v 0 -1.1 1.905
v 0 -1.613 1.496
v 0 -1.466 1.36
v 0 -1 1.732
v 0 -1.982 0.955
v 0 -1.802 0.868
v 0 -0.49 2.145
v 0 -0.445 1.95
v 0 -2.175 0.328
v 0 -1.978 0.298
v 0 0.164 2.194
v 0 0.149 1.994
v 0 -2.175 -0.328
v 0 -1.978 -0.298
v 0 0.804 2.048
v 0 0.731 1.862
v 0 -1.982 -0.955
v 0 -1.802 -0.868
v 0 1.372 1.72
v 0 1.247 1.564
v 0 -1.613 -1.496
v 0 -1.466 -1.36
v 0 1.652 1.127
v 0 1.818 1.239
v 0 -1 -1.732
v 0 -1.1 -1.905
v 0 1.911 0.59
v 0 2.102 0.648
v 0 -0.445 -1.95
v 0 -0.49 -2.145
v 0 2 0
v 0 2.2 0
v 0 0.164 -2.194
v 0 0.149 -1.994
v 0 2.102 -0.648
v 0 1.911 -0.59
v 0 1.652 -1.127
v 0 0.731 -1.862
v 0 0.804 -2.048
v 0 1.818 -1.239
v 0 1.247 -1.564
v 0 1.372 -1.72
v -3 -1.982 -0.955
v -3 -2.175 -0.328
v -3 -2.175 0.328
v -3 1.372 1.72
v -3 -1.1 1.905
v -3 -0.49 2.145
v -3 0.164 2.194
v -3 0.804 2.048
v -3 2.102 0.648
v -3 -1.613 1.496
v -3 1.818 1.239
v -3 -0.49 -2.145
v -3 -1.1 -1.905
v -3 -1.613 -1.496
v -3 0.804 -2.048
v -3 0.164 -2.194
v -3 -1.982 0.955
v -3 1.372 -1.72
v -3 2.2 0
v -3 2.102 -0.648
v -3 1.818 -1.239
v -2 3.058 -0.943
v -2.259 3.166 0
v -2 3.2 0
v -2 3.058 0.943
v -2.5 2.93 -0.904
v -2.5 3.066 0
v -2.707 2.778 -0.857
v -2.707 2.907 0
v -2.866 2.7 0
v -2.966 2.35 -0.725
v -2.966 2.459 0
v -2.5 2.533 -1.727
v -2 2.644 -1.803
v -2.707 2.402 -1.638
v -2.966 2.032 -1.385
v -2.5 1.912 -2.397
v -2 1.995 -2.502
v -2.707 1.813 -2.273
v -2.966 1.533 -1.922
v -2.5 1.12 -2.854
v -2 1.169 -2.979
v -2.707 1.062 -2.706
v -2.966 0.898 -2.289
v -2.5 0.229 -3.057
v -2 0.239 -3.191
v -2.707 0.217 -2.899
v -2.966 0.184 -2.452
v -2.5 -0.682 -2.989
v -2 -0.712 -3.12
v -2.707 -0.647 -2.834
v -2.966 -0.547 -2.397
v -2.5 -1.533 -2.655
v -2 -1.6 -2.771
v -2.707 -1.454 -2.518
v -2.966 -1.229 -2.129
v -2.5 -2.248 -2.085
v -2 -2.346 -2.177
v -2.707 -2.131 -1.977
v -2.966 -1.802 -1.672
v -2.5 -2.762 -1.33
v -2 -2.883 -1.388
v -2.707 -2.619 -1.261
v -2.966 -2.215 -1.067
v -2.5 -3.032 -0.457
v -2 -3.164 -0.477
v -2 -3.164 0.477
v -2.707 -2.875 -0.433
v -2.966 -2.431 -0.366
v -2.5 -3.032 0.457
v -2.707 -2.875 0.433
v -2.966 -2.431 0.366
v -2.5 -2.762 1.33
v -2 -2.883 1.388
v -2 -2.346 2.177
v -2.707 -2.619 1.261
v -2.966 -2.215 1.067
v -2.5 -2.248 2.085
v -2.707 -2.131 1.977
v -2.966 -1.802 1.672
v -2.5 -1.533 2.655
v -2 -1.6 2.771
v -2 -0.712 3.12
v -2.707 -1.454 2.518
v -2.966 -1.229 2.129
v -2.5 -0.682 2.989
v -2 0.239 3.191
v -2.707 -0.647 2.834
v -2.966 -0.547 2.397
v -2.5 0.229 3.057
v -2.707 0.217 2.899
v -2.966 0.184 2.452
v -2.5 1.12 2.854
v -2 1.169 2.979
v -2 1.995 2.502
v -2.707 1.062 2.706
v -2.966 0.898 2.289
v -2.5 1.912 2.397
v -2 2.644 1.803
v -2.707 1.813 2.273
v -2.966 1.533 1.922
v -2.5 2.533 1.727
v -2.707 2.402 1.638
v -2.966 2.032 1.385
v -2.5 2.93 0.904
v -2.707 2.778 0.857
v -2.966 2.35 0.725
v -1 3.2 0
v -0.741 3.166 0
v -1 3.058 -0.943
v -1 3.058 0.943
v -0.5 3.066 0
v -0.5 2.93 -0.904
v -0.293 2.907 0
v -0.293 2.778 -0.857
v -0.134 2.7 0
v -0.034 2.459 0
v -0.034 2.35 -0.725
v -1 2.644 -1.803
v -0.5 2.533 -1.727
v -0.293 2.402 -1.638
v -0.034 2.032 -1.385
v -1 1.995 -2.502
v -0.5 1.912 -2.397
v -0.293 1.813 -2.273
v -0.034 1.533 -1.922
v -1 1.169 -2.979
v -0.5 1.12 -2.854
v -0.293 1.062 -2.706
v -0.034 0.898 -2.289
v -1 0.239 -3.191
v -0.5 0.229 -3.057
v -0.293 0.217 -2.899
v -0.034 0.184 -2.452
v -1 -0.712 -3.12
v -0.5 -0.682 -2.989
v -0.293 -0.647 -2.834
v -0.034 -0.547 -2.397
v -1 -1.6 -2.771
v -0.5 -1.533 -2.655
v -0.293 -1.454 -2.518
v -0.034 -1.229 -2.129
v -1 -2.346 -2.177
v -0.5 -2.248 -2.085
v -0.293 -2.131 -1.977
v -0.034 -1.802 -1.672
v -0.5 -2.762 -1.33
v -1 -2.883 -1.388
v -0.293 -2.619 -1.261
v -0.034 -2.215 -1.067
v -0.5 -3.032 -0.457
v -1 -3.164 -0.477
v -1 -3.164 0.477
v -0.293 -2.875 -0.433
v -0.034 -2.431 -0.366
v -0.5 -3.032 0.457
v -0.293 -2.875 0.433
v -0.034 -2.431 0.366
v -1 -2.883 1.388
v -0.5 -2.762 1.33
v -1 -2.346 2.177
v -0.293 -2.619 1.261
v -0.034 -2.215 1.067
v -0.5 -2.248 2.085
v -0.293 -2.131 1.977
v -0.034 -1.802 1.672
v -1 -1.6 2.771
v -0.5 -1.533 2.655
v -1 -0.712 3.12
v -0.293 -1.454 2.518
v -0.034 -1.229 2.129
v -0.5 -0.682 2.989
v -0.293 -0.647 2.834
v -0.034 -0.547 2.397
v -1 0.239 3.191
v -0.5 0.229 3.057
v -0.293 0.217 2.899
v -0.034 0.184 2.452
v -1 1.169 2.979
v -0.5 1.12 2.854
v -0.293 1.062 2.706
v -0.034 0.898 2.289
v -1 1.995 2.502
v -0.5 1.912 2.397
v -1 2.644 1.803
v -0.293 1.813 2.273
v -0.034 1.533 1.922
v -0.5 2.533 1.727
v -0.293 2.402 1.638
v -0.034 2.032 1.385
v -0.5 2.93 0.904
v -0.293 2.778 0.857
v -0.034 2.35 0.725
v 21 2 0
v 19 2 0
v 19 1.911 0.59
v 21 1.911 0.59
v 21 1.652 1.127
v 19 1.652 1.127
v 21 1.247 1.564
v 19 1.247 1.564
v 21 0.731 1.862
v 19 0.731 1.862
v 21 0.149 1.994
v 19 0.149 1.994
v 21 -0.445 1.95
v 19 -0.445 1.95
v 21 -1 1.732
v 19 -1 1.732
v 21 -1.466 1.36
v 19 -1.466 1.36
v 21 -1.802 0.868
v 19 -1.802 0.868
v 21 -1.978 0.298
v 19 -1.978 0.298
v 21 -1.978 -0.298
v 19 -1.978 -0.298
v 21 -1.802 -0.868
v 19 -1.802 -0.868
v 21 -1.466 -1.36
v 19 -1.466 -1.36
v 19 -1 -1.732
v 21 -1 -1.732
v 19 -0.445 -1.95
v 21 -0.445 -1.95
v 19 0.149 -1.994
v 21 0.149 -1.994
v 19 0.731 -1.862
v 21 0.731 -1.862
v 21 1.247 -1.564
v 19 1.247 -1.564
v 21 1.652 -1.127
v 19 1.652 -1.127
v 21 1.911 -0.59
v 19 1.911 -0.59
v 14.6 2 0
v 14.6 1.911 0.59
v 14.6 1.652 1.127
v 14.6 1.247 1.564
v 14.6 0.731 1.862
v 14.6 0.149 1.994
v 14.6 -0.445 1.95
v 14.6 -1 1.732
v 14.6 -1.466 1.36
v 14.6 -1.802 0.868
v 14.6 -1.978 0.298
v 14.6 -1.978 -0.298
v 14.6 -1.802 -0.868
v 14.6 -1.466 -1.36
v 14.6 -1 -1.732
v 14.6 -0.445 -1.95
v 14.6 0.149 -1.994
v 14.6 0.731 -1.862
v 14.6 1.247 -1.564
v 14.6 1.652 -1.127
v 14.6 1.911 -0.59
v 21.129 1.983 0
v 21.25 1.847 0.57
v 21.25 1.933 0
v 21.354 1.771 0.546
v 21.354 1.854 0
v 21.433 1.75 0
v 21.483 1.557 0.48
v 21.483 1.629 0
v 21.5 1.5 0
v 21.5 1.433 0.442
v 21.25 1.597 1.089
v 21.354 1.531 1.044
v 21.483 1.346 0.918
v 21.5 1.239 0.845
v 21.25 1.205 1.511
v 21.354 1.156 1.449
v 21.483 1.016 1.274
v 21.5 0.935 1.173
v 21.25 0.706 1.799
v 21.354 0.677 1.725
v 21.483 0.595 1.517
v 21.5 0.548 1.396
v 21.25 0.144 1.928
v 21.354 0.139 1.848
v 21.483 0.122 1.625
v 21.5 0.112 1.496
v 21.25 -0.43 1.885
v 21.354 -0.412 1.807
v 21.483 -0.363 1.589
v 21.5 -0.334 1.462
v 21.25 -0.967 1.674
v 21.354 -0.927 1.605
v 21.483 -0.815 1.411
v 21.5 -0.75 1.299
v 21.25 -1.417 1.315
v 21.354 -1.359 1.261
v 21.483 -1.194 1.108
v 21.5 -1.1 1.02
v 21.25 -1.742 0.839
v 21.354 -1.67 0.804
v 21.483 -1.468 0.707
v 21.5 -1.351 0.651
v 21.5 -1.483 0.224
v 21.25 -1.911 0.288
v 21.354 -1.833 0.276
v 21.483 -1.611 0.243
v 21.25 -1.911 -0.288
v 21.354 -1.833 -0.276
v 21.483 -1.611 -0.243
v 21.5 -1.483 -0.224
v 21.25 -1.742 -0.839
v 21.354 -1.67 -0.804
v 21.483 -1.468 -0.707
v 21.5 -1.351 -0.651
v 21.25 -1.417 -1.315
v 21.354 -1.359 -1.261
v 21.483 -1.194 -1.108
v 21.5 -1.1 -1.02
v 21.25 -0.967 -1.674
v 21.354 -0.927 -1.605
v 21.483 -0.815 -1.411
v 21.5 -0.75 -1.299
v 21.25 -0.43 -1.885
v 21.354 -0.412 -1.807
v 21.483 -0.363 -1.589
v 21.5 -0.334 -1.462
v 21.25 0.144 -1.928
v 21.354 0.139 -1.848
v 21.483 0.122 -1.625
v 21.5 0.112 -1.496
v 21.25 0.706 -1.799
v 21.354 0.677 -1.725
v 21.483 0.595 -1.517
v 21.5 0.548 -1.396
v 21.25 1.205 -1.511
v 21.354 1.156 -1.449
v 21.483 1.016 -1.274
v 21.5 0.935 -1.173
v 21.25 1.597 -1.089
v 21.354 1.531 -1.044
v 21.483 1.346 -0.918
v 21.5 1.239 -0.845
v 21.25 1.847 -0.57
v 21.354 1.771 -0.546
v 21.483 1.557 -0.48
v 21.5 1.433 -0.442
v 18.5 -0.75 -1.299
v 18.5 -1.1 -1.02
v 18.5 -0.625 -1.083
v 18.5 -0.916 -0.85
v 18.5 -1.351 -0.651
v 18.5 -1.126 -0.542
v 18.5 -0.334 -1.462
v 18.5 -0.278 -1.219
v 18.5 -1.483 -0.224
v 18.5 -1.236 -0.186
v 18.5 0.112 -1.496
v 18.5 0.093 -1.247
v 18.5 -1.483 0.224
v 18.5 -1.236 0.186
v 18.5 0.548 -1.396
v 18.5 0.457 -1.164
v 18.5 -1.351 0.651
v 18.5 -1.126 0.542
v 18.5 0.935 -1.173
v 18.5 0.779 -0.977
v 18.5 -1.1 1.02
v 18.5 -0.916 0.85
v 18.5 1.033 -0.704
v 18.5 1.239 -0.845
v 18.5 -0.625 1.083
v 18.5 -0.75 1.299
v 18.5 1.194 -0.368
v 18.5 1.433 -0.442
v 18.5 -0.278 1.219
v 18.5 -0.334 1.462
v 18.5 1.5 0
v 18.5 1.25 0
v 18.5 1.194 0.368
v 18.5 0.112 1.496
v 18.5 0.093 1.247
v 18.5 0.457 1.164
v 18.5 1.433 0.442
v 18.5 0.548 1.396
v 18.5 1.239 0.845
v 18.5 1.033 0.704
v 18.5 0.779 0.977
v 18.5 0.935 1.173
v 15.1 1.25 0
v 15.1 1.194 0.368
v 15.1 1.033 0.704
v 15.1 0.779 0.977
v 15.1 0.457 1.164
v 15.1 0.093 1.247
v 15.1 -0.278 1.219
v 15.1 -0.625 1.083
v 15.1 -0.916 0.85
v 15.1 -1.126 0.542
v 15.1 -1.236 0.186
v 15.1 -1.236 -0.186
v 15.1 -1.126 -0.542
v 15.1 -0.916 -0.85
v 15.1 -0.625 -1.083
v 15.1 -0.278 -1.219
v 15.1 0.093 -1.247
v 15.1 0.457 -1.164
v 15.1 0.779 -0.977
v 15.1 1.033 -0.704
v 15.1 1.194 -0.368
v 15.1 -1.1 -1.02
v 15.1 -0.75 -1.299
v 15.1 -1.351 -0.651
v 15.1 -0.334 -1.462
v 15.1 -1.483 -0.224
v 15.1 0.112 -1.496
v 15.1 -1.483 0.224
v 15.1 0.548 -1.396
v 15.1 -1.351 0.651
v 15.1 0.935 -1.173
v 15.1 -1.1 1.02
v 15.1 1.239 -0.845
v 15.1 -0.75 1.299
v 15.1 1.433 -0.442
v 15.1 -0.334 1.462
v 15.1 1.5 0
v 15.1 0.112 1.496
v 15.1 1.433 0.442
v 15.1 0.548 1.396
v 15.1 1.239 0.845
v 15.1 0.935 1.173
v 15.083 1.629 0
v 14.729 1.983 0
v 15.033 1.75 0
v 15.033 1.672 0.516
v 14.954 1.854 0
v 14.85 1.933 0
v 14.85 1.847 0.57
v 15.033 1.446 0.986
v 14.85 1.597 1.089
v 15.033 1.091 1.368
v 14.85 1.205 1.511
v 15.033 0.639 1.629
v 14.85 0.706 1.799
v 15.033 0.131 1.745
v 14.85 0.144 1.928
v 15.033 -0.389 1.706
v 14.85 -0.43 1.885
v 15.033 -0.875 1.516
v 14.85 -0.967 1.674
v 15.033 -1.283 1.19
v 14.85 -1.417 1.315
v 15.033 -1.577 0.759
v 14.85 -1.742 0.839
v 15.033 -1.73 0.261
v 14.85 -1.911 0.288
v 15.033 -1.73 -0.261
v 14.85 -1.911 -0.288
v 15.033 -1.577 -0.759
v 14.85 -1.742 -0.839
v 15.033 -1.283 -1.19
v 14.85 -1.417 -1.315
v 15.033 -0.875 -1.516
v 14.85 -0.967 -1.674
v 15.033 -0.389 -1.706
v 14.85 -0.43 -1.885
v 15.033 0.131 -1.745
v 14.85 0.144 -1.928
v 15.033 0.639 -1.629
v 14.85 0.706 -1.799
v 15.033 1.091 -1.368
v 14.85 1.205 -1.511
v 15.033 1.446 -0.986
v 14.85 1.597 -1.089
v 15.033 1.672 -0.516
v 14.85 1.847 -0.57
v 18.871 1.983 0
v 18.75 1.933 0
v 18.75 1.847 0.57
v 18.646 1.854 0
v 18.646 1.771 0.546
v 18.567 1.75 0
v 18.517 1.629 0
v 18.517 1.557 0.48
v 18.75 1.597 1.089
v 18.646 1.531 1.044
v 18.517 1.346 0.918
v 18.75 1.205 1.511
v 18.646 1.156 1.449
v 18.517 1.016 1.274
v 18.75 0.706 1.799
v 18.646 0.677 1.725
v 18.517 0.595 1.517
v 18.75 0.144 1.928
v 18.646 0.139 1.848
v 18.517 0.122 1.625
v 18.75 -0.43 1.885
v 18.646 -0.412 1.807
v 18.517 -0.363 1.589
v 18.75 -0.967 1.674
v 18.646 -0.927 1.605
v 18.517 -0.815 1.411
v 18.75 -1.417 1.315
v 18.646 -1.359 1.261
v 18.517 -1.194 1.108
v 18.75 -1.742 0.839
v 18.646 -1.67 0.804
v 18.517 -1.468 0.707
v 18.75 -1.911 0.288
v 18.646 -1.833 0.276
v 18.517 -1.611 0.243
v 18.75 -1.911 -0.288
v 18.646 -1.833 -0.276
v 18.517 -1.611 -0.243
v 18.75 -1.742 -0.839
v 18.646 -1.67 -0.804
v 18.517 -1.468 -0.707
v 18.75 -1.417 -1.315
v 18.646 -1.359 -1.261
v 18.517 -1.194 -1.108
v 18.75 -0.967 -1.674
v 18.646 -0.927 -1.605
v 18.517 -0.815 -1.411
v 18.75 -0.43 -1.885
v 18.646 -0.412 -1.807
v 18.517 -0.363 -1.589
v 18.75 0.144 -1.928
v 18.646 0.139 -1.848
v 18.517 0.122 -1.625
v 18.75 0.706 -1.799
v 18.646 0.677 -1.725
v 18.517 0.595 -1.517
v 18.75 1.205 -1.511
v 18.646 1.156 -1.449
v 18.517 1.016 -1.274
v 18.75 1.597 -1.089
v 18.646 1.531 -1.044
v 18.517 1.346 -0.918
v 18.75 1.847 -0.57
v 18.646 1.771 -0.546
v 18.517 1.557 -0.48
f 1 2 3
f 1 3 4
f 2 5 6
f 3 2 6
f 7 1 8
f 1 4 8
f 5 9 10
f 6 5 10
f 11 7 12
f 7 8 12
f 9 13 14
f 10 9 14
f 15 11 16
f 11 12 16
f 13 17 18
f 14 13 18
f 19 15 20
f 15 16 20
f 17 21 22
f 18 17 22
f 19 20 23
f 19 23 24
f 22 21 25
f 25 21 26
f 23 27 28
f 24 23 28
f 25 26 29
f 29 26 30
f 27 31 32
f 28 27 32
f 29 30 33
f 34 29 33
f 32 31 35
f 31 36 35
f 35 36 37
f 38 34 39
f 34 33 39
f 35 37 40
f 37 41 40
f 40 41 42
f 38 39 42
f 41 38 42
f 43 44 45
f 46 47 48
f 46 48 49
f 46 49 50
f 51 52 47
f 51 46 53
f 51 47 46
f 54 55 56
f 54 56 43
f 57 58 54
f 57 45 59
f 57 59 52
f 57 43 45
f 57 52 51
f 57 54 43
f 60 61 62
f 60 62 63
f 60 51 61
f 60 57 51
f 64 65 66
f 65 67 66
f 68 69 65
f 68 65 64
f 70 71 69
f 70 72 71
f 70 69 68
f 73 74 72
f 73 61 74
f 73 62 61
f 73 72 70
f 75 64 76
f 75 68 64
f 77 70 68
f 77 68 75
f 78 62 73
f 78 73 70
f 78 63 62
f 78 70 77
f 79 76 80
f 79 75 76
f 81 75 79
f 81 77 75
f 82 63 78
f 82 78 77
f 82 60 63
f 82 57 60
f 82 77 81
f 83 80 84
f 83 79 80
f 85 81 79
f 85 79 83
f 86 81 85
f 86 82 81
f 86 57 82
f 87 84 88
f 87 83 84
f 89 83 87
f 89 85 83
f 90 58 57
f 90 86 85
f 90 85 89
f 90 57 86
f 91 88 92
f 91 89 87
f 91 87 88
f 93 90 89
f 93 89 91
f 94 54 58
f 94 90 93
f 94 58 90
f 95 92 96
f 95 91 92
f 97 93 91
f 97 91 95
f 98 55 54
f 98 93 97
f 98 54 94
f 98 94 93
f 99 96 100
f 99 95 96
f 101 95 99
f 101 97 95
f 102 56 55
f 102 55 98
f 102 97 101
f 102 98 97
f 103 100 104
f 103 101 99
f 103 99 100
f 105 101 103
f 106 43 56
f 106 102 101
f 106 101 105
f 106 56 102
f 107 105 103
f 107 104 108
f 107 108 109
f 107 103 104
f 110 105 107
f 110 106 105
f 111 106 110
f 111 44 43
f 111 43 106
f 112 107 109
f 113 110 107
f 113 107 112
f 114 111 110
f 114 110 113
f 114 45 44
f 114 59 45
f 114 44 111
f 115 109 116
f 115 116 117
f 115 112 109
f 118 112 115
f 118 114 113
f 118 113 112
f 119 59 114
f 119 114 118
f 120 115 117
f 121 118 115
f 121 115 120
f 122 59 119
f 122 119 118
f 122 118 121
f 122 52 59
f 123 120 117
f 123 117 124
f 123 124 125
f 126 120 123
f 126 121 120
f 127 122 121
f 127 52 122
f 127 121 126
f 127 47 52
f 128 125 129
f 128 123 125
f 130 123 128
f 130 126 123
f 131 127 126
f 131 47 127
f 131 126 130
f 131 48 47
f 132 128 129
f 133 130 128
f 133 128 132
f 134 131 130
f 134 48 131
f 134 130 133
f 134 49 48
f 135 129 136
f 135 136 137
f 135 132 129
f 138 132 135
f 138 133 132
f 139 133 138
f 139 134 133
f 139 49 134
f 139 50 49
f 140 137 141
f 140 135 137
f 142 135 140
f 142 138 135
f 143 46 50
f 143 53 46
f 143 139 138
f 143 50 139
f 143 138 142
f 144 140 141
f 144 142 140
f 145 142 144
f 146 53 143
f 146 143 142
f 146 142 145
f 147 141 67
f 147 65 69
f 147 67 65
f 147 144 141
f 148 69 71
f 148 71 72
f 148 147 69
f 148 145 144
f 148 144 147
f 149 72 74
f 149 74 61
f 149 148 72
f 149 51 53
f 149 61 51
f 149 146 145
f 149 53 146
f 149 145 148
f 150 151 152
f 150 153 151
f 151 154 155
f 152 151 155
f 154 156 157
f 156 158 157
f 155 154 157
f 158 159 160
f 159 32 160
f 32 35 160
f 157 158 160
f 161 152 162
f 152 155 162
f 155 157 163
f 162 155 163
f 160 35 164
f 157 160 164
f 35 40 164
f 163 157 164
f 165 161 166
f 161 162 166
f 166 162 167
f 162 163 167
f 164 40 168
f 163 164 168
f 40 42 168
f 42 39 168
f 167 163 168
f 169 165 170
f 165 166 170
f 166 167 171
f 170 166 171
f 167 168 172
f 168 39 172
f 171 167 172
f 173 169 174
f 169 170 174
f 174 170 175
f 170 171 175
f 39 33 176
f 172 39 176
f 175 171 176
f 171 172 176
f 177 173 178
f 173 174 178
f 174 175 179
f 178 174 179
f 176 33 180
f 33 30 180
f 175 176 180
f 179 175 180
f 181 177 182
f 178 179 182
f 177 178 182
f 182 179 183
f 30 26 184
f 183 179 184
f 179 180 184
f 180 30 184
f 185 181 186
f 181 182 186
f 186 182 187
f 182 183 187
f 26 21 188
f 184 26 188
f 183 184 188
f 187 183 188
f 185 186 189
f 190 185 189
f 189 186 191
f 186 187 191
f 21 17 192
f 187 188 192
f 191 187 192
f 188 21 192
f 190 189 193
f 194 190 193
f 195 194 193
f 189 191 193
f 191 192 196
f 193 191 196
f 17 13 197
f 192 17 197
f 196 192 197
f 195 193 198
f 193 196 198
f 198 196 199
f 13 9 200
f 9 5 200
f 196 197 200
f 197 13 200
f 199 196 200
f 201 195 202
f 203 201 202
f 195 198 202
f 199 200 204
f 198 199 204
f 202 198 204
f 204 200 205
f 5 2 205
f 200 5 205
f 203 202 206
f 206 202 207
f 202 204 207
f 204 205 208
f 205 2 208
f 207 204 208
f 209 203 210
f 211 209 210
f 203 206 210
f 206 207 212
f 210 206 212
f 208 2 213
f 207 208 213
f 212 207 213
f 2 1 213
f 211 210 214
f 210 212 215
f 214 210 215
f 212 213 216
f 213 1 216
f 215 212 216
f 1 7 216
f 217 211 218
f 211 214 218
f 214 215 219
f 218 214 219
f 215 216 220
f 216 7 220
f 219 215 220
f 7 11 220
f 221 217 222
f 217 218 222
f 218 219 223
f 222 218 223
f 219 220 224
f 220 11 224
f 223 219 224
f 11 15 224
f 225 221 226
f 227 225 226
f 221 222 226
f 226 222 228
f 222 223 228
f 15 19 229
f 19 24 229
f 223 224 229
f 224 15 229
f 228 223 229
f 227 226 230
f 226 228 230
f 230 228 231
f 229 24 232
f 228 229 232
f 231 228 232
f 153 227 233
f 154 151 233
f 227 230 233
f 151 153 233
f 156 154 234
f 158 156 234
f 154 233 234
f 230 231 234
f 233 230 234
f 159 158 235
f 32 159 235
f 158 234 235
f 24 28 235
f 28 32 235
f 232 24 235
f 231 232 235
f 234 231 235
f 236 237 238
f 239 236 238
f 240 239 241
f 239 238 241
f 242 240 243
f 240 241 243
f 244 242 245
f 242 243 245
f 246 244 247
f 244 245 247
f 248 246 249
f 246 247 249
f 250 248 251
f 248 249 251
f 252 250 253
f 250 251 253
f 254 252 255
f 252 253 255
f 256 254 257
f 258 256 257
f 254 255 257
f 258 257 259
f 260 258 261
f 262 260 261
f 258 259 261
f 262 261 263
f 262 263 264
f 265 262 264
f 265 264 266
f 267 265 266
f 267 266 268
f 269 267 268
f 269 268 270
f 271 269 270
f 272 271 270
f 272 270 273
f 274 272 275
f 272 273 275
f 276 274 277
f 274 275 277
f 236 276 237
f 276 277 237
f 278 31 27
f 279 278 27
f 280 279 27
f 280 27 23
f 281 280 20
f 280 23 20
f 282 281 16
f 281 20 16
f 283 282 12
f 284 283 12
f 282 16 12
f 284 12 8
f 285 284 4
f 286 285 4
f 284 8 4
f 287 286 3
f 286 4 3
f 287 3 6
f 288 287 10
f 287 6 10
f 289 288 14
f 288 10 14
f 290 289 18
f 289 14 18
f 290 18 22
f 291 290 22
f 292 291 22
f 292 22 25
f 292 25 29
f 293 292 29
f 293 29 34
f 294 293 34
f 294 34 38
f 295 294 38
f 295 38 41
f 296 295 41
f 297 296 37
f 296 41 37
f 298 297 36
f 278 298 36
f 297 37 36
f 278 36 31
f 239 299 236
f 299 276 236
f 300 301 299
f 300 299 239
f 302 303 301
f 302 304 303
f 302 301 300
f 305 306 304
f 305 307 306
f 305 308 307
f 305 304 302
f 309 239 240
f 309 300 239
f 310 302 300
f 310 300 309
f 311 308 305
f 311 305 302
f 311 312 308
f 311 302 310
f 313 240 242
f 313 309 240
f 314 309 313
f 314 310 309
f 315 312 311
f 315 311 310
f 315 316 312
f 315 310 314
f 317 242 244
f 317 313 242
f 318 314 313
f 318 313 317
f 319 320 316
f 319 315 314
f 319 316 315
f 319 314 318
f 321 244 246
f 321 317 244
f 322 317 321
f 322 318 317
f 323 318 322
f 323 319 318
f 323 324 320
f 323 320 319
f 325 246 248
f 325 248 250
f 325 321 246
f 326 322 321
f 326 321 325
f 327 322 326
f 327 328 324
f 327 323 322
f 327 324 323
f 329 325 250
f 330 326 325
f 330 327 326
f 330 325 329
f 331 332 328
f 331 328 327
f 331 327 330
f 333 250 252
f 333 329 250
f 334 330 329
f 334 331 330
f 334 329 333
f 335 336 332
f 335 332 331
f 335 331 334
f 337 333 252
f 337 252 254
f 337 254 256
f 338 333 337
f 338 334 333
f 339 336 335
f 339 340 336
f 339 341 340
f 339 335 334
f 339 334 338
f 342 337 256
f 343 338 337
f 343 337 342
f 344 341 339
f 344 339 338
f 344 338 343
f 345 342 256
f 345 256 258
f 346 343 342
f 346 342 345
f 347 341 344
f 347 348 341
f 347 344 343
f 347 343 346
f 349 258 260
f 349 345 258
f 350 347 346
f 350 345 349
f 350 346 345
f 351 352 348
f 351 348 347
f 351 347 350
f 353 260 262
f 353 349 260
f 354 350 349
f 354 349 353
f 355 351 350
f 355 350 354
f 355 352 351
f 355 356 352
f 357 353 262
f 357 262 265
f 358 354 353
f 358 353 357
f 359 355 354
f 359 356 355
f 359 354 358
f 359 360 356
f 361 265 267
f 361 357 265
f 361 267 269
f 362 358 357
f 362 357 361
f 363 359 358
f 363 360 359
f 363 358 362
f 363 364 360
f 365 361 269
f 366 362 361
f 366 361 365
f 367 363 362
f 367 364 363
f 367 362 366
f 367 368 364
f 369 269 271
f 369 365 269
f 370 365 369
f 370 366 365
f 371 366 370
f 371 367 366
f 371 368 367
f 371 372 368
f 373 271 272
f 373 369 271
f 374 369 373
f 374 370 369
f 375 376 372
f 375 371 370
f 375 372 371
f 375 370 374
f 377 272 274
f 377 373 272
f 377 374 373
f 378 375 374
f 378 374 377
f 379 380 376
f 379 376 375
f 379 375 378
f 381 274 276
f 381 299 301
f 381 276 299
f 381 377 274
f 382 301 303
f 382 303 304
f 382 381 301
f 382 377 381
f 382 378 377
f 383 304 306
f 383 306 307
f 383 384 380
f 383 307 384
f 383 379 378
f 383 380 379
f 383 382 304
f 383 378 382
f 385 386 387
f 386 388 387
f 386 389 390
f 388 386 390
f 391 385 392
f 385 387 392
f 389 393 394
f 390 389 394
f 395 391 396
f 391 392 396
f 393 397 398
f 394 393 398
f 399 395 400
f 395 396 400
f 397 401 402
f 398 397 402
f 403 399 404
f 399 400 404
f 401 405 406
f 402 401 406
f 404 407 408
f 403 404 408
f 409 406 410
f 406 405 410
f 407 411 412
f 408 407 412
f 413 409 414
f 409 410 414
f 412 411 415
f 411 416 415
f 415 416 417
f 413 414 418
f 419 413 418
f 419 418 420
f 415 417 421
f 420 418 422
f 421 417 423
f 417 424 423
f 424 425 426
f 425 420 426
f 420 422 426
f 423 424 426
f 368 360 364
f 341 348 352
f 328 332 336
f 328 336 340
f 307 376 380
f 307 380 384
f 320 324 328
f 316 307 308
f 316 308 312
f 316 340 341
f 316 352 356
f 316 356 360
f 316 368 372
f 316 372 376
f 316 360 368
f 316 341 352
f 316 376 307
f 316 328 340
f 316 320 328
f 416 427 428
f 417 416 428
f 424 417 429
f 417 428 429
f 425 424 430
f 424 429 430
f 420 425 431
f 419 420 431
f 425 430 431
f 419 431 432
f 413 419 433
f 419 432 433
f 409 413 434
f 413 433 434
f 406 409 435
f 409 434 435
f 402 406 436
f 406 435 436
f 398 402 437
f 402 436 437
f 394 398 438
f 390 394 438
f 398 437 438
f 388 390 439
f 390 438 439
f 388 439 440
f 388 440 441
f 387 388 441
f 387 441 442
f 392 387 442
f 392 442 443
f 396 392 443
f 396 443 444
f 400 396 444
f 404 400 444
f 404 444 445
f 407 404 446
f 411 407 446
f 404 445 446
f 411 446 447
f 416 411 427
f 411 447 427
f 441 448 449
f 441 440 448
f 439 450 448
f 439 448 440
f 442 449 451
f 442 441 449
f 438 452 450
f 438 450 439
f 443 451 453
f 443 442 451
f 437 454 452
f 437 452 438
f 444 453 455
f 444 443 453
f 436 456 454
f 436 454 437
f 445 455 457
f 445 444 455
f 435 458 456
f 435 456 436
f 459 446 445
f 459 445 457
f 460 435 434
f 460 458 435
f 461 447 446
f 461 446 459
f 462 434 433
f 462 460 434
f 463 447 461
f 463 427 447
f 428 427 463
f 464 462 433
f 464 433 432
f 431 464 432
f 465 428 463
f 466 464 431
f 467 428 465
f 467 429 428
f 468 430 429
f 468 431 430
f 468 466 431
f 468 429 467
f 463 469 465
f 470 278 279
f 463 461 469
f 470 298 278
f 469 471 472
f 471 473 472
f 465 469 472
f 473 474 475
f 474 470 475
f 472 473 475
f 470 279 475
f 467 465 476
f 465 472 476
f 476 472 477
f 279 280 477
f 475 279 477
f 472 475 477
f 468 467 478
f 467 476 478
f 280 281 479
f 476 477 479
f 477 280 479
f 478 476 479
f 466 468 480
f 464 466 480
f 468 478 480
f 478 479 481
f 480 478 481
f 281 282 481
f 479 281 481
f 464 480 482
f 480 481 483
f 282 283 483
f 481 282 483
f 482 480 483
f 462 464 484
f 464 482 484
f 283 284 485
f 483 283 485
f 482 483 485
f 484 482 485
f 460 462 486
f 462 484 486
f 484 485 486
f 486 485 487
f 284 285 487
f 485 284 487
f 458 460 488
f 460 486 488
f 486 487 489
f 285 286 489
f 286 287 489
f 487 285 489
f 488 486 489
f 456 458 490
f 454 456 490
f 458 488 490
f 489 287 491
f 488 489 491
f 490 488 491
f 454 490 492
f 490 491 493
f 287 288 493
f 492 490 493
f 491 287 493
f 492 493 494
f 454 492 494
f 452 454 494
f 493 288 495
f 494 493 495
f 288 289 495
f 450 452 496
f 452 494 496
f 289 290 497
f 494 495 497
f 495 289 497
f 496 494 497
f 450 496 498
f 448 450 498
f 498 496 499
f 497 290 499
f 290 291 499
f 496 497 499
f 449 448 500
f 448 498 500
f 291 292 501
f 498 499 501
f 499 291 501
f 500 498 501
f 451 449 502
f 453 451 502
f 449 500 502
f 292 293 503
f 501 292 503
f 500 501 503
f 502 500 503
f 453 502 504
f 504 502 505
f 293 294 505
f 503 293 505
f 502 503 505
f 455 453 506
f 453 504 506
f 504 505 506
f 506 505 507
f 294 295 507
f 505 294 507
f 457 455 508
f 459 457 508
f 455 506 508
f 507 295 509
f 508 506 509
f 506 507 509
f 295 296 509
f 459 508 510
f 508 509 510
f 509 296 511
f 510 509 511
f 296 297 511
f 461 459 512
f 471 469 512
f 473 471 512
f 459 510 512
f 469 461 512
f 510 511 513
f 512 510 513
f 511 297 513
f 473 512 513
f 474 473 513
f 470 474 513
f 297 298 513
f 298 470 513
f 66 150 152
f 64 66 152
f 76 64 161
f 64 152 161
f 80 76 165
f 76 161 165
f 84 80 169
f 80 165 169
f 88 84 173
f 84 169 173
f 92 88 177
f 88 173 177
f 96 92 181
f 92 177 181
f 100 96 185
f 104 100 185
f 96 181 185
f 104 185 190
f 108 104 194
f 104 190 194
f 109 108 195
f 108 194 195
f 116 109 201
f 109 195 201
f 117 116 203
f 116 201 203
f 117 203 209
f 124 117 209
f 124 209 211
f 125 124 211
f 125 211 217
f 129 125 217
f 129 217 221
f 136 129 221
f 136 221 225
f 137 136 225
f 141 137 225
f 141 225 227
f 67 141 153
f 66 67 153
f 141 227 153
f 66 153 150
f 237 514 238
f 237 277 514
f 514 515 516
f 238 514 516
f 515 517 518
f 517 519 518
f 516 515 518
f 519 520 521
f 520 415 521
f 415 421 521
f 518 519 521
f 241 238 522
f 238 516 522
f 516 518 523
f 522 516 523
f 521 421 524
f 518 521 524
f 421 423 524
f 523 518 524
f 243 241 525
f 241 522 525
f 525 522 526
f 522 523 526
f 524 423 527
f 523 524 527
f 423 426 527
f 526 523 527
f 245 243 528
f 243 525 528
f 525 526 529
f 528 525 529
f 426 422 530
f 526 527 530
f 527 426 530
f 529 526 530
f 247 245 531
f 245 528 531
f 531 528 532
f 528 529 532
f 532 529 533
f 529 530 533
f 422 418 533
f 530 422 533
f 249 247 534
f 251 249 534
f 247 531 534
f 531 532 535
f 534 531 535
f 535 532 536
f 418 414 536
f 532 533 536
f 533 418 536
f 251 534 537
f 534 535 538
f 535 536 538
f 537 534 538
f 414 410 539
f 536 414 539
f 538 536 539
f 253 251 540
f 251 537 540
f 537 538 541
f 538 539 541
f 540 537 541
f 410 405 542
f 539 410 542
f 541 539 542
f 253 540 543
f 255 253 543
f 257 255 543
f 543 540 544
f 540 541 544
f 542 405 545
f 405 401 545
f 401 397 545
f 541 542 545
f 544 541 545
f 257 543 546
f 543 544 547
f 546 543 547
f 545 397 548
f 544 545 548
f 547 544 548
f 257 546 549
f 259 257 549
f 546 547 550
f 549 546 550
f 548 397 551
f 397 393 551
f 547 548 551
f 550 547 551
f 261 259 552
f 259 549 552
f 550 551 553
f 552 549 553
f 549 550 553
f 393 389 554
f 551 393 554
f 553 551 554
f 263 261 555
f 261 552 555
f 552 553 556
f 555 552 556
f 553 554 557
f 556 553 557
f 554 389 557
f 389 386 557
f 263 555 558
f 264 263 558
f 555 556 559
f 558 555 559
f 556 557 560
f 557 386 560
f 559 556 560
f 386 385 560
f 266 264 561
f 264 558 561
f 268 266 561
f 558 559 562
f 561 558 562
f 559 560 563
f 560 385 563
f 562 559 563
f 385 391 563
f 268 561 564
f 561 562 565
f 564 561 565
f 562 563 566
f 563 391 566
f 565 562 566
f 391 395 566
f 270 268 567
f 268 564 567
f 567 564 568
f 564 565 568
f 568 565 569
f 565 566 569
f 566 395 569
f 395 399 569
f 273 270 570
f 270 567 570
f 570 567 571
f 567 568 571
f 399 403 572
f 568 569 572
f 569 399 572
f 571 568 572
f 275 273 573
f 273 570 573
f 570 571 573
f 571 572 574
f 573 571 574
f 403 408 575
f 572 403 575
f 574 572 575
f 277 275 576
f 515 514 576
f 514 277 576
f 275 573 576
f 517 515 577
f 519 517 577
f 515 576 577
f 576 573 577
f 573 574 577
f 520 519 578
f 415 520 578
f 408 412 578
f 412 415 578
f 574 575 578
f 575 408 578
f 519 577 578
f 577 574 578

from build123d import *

# Parameters (mm, degrees)
SKETCH_R     = 2
PAD_DEPTH    = 15.1
SKETCH001_R  = 3.2
PAD001_DEPTH = 3
SKETCH002_R  = 1.25
PAD002_DEPTH = 3.4
SKETCH003_R  = 2
PAD003_DEPTH = 3
FILLET_R     = 0.5
FILLET001_R  = 0.5
FILLET002_R  = 0.5
FILLET003_R  = 1
FILLET004_R  = 1


with BuildPart() as part:
    # Sketch → Pad (new body)
    with BuildSketch(Plane.YZ):
        Circle(SKETCH_R)
    extrude(amount=PAD_DEPTH)

    # Sketch001 → Pad001 (join)
    with BuildSketch(Plane(origin=(0, 0, 0), x_dir=(0, 1, 0), z_dir=(-1, 0, 0))):
        Circle(SKETCH001_R)
    extrude(amount=PAD001_DEPTH)

    # Sketch002 → Pad002 (join)
    with BuildSketch(Plane.YZ.offset(15.1)):
        Circle(SKETCH002_R)
    extrude(amount=PAD002_DEPTH)

    # Sketch003 → Pad003 (join)
    with BuildSketch(Plane.YZ.offset(18.5)):
        Circle(SKETCH003_R)
    extrude(amount=PAD003_DEPTH)

    # Fillet
    fillet_edges = [part.edges().sort_by_distance(p)[0] for p in [
        (18.5, -2, 0),
    ]]
    fillet(fillet_edges, radius=FILLET_R)

    # Fillet001
    fillet001_edges = [part.edges().sort_by_distance(p)[0] for p in [
        (21.5, -2, 0),
    ]]
    fillet(fillet001_edges, radius=FILLET001_R)

    # Fillet002
    fillet002_edges = [part.edges().sort_by_distance(p)[0] for p in [
        (15.1, -2, 0),
    ]]
    fillet(fillet002_edges, radius=FILLET002_R)

    # Fillet003
    fillet003_edges = [part.edges().sort_by_distance(p)[0] for p in [
        (-3, -3.2, 0),
    ]]
    fillet(fillet003_edges, radius=FILLET003_R)

    # Fillet004
    fillet004_edges = [part.edges().sort_by_distance(p)[0] for p in [
        (0, -3.2, 0),
    ]]
    fillet(fillet004_edges, radius=FILLET004_R)


solid = part.part
